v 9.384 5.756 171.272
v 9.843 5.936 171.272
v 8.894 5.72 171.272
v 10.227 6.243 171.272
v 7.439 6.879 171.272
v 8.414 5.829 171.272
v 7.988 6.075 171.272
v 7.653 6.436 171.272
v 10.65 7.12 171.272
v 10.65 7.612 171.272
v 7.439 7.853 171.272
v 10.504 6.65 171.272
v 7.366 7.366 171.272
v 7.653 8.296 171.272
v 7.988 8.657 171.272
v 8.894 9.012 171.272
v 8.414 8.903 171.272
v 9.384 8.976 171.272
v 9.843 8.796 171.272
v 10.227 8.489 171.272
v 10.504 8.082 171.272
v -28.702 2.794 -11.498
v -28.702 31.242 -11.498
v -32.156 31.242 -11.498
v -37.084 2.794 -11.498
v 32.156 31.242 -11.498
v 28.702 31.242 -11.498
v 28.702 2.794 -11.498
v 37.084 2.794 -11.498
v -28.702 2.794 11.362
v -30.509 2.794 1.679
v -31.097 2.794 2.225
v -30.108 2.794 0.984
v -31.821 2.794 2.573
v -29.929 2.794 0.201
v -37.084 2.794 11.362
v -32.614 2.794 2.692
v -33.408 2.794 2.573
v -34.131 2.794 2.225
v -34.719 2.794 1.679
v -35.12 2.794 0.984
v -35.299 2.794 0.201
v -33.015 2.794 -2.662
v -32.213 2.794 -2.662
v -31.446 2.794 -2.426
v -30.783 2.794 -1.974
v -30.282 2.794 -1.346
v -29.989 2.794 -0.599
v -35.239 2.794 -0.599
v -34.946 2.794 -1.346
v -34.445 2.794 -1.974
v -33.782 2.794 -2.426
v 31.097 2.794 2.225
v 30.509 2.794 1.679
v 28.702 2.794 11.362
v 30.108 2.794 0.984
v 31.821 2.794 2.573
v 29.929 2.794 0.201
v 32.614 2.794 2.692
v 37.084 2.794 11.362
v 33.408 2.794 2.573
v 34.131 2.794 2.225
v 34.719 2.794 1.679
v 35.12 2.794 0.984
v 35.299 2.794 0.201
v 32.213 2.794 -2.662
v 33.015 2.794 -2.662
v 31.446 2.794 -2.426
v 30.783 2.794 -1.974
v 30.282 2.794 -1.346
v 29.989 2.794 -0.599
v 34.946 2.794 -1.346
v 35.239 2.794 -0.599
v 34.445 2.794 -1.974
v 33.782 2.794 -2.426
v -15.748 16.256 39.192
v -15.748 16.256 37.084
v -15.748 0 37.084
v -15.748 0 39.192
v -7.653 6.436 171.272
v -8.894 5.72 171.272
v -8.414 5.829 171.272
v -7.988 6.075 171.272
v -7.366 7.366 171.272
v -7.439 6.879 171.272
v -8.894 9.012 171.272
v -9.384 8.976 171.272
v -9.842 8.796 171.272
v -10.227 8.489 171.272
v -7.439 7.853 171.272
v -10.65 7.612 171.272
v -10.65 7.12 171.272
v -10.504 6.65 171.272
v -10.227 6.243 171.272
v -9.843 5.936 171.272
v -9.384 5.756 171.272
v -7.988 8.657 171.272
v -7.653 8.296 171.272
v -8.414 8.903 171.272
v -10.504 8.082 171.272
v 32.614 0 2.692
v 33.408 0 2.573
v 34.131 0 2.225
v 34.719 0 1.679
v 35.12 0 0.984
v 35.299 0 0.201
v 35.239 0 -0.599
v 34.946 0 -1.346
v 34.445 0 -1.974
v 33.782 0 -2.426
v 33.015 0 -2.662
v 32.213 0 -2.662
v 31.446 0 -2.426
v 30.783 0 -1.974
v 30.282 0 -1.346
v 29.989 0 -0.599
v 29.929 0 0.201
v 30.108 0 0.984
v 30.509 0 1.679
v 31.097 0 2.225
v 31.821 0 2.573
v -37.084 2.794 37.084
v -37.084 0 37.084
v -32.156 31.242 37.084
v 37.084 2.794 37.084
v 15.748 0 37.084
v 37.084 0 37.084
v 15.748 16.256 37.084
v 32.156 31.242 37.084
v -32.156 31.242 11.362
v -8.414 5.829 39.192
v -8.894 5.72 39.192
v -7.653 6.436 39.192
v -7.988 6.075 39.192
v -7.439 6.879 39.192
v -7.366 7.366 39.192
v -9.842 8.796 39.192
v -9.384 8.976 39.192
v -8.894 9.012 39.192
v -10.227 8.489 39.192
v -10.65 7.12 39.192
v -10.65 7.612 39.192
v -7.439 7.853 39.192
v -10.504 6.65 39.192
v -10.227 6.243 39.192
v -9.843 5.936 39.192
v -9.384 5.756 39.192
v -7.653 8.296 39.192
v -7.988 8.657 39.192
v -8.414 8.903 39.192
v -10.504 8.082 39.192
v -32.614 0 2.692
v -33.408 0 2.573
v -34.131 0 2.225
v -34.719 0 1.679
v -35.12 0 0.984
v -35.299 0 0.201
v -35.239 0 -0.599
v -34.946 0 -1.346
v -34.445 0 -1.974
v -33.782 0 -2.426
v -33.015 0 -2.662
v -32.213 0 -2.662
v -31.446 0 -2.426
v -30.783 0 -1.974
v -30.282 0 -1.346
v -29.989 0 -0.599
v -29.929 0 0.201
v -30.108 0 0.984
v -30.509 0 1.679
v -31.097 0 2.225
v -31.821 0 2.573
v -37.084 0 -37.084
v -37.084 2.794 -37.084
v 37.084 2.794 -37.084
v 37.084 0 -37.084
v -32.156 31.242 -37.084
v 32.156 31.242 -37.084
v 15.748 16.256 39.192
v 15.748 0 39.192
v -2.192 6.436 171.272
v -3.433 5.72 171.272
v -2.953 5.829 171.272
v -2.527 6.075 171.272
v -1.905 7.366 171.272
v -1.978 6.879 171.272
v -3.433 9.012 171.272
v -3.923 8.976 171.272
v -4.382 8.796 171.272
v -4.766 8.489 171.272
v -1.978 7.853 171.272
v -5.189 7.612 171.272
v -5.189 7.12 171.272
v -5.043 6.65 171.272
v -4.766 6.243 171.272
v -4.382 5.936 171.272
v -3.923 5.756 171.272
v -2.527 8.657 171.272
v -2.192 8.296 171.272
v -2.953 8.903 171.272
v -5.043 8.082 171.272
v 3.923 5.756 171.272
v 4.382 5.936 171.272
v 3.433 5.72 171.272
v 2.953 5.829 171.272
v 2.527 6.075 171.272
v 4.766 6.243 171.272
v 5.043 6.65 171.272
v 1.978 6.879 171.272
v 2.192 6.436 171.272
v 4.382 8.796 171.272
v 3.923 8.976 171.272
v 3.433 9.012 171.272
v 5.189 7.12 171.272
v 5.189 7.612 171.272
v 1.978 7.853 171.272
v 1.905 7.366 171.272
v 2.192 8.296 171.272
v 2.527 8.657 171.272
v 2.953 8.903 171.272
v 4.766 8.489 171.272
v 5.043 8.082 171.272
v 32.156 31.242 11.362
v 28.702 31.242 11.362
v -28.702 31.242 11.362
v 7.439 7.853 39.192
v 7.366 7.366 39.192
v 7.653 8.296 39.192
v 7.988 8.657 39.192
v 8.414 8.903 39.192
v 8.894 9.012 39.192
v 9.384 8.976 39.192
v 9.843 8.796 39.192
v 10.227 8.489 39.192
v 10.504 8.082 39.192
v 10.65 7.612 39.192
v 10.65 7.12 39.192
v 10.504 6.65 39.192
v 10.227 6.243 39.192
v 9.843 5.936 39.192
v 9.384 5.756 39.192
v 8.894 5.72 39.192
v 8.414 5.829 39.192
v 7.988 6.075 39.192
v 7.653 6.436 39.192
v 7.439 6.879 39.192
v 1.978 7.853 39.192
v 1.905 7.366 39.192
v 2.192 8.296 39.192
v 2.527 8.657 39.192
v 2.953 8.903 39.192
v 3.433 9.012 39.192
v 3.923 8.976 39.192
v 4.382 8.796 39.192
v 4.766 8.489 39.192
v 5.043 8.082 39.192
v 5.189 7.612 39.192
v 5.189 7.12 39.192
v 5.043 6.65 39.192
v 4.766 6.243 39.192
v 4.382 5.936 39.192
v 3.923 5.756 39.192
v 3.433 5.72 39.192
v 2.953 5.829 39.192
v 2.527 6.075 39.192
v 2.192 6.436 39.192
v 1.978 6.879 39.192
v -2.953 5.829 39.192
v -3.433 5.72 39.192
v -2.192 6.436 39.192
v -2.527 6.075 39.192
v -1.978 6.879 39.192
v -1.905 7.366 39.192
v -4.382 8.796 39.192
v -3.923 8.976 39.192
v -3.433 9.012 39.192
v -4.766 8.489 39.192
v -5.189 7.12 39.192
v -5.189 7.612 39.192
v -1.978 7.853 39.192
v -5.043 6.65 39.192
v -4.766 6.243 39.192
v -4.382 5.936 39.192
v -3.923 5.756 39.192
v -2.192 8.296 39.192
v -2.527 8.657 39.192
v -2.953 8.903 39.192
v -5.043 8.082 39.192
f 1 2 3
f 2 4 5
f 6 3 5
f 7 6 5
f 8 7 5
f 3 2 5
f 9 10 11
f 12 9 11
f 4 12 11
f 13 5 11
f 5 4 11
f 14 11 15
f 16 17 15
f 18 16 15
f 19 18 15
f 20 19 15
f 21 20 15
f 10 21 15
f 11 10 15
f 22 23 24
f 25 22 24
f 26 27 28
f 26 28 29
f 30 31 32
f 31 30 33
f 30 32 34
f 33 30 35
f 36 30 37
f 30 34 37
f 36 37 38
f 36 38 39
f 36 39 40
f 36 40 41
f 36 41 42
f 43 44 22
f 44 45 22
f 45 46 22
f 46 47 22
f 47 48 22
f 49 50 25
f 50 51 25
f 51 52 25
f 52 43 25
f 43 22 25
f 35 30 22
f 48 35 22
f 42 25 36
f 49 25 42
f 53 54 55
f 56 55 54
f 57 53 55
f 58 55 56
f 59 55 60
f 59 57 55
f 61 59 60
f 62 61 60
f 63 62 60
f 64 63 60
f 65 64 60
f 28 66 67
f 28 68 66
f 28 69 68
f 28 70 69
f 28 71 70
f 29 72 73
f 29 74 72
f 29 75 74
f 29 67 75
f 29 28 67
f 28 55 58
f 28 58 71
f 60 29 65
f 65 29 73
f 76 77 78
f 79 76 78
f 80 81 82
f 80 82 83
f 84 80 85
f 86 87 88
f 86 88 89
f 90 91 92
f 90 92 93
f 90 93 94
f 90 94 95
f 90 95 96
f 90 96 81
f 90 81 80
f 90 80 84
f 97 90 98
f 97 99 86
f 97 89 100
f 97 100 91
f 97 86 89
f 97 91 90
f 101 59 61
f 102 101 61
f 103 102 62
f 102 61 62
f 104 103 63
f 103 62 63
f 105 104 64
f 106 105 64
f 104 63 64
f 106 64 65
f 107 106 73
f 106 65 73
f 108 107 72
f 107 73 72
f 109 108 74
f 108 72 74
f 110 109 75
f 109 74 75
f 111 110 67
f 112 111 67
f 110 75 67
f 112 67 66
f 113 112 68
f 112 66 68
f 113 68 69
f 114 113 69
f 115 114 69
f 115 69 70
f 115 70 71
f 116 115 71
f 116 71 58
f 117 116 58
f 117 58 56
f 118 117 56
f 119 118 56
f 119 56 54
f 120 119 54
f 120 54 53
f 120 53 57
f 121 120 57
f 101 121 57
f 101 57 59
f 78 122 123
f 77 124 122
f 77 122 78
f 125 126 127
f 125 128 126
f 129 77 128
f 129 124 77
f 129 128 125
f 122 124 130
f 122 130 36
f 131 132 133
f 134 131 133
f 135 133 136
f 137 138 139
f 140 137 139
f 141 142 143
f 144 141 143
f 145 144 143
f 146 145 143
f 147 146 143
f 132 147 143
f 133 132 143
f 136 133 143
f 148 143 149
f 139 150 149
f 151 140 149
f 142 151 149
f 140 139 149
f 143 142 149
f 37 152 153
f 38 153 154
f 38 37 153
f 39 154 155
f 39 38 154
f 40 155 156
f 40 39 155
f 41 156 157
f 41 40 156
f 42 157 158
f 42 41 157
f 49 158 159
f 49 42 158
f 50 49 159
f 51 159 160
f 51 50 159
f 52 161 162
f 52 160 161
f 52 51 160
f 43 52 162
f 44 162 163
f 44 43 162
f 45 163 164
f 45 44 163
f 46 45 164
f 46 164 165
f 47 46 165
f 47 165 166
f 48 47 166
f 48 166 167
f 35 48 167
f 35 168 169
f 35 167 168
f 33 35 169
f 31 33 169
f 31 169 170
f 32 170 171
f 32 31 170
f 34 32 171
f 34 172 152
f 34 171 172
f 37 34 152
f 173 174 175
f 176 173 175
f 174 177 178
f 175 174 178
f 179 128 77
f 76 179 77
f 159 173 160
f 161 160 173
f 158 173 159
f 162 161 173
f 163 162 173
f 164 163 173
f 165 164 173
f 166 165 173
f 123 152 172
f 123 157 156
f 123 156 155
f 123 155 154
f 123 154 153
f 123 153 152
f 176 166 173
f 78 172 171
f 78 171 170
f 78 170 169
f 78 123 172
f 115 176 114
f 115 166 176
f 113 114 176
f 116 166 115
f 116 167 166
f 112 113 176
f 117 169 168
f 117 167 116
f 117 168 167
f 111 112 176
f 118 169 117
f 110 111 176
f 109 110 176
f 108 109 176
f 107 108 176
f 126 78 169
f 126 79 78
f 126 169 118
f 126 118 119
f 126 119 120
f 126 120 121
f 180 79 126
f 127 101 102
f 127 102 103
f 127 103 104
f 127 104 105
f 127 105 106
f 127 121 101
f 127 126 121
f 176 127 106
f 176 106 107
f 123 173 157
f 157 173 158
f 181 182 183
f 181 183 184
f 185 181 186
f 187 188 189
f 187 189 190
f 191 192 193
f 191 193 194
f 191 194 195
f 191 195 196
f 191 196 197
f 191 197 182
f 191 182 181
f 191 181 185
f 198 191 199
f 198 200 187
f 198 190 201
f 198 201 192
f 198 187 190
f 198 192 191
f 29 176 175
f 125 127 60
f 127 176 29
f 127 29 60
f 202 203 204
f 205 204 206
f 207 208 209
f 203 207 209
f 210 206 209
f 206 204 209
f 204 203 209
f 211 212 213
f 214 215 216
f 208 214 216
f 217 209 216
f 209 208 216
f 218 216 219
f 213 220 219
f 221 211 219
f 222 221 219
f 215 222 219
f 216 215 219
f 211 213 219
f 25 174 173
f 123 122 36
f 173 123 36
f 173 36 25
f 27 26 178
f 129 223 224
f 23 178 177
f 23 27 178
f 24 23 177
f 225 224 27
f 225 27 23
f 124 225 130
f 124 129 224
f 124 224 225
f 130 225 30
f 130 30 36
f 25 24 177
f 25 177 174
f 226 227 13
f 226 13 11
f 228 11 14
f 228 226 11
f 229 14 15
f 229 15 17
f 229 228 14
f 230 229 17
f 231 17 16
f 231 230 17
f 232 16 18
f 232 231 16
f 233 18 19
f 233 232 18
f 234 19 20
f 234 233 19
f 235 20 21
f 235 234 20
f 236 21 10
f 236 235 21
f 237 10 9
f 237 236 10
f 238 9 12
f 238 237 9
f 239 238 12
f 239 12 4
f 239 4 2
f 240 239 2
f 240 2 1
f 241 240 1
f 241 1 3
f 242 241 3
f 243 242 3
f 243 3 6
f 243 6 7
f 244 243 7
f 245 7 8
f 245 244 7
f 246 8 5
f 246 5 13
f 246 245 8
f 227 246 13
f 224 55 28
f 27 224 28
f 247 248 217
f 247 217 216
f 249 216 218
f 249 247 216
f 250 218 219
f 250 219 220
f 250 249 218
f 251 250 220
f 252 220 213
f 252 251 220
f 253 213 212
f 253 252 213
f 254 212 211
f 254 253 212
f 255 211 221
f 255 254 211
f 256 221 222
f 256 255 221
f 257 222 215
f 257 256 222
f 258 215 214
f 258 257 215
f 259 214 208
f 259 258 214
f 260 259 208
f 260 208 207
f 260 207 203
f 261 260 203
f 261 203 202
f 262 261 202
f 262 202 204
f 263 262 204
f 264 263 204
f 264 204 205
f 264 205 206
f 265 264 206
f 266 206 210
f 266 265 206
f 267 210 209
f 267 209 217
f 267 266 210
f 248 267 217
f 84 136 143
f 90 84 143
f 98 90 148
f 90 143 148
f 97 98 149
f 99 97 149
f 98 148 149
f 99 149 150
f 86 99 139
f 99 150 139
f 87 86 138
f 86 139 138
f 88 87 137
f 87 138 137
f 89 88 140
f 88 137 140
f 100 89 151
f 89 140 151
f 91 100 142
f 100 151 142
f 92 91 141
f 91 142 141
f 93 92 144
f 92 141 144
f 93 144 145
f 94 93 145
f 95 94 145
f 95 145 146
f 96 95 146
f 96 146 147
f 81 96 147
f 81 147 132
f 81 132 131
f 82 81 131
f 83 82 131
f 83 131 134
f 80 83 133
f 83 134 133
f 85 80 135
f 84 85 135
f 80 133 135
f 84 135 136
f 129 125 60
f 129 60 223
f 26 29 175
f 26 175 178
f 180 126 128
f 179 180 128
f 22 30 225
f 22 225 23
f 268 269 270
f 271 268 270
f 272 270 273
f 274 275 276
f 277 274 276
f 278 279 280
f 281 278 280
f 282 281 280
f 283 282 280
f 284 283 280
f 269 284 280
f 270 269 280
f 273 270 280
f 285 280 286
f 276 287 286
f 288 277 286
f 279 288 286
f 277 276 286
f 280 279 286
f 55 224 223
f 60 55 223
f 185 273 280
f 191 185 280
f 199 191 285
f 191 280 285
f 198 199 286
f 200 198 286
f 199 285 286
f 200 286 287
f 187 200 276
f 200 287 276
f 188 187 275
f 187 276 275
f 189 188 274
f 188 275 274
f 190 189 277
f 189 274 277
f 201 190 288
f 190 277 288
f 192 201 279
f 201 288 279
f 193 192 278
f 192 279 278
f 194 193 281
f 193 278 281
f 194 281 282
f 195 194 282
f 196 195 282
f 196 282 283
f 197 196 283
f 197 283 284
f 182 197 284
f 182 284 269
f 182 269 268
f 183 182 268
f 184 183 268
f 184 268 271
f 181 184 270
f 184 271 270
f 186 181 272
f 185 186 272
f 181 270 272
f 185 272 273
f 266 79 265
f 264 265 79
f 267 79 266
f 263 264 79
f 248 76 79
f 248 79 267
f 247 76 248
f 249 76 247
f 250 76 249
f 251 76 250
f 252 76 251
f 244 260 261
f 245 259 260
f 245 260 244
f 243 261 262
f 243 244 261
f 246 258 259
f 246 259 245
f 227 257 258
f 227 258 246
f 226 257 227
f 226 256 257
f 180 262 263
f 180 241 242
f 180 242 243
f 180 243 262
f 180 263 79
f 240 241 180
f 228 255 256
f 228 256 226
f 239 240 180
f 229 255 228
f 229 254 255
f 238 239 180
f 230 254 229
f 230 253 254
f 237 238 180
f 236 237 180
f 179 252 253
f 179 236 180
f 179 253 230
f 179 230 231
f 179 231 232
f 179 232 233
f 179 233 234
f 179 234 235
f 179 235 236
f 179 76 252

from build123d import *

# Parameters (mm, degrees)
BOSS_EXTRUDE1_DEPTH   = 37.084
CUT_EXTRUDE1_START    = 2.794
SKETCH2_W             = 8.382
SKETCH2_H             = 22.86
CUT_EXTRUDE1_DEPTH    = 28.448
SKETCH4_R             = 2.6924
CUT_EXTRUDE2_DEPTH    = 60.663513272
BOSS_EXTRUDE2_DEPTH   = 2.1082
SKETCH6_R             = 1.651
BOSS_EXTRUDE3_DEPTH   = 132.08
BOSS_EXTRUDE3_2_DEPTH = 132.08


with BuildPart() as part:
    # Sketch1 → Boss-Extrude1 (new, symmetric)
    with BuildSketch(Plane.XY):
        Polygon((0, 0), (37.084, 0), (37.084, 2.794), (32.1564, 31.242), (0, 31.242), (-32.1564, 31.242), (-37.084, 2.794), (-37.084, 0), align=None)
    extrude(amount=BOSS_EXTRUDE1_DEPTH, both=True)

    # Sketch2 → Cut-Extrude1 (cut)
    with BuildSketch(Plane(origin=(0, 0, 0), x_dir=(1, 0, 0), z_dir=(0, 1, 0)).offset(CUT_EXTRUDE1_START)):
        with Locations((32.893, 0.068462688)):
            Rectangle(SKETCH2_W, SKETCH2_H)
    cut_extrude1 = extrude(amount=CUT_EXTRUDE1_DEPTH, mode=Mode.SUBTRACT)

    # Sketch4 → Cut-Extrude2 (cut, through all)
    with BuildSketch(Plane(origin=(0, 2.794, 0), x_dir=(1, 0, 0), z_dir=(0, 1, 0))):
        with Locations(Location((32.614124272, 0, 0), (0, 0, 270))):
            Circle(SKETCH4_R)
    cut_extrude2 = extrude(amount=-CUT_EXTRUDE2_DEPTH, mode=Mode.SUBTRACT)

    # Mirror1: Cut-Extrude2 across plane
    add(cut_extrude2.mirror(Plane(origin=(0, 0, 0), x_dir=(0, 0, 1), z_dir=(1, 0, 0))), mode=Mode.SUBTRACT)

    # Mirror2: Cut-Extrude1 across plane
    add(cut_extrude1.mirror(Plane(origin=(0, 0, 0), x_dir=(0, 0, 1), z_dir=(1, 0, 0))), mode=Mode.SUBTRACT)

    # Sketch5 → Boss-Extrude2 (add)
    with BuildSketch(Plane.XY.offset(37.084)):
        Polygon((0, 0), (15.748, 0), (15.748, 16.256), (-15.748, 16.256), (-15.748, 0), align=None)
    extrude(amount=BOSS_EXTRUDE2_DEPTH)


with BuildPart() as body_2:
    # Sketch6 → Boss-Extrude3 (new body)
    with BuildSketch(Plane.XY.offset(39.1922)):
        with Locations((-3.556, 7.366)):
            Circle(SKETCH6_R)
    boss_extrude3 = extrude(amount=BOSS_EXTRUDE3_DEPTH)


with BuildPart() as body_3:
    # Sketch6 → Boss-Extrude3 2 (new body)
    with BuildSketch(Plane.XY.offset(39.1922)):
        with Locations((-9.017, 7.366)):
            Circle(SKETCH6_R)
    boss_extrude3_2 = extrude(amount=BOSS_EXTRUDE3_2_DEPTH)


with BuildPart() as part_1:
    add(part.part)

    # Mirror5: Boss-Extrude3, Boss-Extrude3 2 across plane
    add(boss_extrude3.mirror(Plane(origin=(0, 0, 0), x_dir=(0, 0, 1), z_dir=(1, 0, 0))))
    add(boss_extrude3_2.mirror(Plane(origin=(0, 0, 0), x_dir=(0, 0, 1), z_dir=(1, 0, 0))))


solid = Compound([body_2.part, body_3.part, part_1.part])
